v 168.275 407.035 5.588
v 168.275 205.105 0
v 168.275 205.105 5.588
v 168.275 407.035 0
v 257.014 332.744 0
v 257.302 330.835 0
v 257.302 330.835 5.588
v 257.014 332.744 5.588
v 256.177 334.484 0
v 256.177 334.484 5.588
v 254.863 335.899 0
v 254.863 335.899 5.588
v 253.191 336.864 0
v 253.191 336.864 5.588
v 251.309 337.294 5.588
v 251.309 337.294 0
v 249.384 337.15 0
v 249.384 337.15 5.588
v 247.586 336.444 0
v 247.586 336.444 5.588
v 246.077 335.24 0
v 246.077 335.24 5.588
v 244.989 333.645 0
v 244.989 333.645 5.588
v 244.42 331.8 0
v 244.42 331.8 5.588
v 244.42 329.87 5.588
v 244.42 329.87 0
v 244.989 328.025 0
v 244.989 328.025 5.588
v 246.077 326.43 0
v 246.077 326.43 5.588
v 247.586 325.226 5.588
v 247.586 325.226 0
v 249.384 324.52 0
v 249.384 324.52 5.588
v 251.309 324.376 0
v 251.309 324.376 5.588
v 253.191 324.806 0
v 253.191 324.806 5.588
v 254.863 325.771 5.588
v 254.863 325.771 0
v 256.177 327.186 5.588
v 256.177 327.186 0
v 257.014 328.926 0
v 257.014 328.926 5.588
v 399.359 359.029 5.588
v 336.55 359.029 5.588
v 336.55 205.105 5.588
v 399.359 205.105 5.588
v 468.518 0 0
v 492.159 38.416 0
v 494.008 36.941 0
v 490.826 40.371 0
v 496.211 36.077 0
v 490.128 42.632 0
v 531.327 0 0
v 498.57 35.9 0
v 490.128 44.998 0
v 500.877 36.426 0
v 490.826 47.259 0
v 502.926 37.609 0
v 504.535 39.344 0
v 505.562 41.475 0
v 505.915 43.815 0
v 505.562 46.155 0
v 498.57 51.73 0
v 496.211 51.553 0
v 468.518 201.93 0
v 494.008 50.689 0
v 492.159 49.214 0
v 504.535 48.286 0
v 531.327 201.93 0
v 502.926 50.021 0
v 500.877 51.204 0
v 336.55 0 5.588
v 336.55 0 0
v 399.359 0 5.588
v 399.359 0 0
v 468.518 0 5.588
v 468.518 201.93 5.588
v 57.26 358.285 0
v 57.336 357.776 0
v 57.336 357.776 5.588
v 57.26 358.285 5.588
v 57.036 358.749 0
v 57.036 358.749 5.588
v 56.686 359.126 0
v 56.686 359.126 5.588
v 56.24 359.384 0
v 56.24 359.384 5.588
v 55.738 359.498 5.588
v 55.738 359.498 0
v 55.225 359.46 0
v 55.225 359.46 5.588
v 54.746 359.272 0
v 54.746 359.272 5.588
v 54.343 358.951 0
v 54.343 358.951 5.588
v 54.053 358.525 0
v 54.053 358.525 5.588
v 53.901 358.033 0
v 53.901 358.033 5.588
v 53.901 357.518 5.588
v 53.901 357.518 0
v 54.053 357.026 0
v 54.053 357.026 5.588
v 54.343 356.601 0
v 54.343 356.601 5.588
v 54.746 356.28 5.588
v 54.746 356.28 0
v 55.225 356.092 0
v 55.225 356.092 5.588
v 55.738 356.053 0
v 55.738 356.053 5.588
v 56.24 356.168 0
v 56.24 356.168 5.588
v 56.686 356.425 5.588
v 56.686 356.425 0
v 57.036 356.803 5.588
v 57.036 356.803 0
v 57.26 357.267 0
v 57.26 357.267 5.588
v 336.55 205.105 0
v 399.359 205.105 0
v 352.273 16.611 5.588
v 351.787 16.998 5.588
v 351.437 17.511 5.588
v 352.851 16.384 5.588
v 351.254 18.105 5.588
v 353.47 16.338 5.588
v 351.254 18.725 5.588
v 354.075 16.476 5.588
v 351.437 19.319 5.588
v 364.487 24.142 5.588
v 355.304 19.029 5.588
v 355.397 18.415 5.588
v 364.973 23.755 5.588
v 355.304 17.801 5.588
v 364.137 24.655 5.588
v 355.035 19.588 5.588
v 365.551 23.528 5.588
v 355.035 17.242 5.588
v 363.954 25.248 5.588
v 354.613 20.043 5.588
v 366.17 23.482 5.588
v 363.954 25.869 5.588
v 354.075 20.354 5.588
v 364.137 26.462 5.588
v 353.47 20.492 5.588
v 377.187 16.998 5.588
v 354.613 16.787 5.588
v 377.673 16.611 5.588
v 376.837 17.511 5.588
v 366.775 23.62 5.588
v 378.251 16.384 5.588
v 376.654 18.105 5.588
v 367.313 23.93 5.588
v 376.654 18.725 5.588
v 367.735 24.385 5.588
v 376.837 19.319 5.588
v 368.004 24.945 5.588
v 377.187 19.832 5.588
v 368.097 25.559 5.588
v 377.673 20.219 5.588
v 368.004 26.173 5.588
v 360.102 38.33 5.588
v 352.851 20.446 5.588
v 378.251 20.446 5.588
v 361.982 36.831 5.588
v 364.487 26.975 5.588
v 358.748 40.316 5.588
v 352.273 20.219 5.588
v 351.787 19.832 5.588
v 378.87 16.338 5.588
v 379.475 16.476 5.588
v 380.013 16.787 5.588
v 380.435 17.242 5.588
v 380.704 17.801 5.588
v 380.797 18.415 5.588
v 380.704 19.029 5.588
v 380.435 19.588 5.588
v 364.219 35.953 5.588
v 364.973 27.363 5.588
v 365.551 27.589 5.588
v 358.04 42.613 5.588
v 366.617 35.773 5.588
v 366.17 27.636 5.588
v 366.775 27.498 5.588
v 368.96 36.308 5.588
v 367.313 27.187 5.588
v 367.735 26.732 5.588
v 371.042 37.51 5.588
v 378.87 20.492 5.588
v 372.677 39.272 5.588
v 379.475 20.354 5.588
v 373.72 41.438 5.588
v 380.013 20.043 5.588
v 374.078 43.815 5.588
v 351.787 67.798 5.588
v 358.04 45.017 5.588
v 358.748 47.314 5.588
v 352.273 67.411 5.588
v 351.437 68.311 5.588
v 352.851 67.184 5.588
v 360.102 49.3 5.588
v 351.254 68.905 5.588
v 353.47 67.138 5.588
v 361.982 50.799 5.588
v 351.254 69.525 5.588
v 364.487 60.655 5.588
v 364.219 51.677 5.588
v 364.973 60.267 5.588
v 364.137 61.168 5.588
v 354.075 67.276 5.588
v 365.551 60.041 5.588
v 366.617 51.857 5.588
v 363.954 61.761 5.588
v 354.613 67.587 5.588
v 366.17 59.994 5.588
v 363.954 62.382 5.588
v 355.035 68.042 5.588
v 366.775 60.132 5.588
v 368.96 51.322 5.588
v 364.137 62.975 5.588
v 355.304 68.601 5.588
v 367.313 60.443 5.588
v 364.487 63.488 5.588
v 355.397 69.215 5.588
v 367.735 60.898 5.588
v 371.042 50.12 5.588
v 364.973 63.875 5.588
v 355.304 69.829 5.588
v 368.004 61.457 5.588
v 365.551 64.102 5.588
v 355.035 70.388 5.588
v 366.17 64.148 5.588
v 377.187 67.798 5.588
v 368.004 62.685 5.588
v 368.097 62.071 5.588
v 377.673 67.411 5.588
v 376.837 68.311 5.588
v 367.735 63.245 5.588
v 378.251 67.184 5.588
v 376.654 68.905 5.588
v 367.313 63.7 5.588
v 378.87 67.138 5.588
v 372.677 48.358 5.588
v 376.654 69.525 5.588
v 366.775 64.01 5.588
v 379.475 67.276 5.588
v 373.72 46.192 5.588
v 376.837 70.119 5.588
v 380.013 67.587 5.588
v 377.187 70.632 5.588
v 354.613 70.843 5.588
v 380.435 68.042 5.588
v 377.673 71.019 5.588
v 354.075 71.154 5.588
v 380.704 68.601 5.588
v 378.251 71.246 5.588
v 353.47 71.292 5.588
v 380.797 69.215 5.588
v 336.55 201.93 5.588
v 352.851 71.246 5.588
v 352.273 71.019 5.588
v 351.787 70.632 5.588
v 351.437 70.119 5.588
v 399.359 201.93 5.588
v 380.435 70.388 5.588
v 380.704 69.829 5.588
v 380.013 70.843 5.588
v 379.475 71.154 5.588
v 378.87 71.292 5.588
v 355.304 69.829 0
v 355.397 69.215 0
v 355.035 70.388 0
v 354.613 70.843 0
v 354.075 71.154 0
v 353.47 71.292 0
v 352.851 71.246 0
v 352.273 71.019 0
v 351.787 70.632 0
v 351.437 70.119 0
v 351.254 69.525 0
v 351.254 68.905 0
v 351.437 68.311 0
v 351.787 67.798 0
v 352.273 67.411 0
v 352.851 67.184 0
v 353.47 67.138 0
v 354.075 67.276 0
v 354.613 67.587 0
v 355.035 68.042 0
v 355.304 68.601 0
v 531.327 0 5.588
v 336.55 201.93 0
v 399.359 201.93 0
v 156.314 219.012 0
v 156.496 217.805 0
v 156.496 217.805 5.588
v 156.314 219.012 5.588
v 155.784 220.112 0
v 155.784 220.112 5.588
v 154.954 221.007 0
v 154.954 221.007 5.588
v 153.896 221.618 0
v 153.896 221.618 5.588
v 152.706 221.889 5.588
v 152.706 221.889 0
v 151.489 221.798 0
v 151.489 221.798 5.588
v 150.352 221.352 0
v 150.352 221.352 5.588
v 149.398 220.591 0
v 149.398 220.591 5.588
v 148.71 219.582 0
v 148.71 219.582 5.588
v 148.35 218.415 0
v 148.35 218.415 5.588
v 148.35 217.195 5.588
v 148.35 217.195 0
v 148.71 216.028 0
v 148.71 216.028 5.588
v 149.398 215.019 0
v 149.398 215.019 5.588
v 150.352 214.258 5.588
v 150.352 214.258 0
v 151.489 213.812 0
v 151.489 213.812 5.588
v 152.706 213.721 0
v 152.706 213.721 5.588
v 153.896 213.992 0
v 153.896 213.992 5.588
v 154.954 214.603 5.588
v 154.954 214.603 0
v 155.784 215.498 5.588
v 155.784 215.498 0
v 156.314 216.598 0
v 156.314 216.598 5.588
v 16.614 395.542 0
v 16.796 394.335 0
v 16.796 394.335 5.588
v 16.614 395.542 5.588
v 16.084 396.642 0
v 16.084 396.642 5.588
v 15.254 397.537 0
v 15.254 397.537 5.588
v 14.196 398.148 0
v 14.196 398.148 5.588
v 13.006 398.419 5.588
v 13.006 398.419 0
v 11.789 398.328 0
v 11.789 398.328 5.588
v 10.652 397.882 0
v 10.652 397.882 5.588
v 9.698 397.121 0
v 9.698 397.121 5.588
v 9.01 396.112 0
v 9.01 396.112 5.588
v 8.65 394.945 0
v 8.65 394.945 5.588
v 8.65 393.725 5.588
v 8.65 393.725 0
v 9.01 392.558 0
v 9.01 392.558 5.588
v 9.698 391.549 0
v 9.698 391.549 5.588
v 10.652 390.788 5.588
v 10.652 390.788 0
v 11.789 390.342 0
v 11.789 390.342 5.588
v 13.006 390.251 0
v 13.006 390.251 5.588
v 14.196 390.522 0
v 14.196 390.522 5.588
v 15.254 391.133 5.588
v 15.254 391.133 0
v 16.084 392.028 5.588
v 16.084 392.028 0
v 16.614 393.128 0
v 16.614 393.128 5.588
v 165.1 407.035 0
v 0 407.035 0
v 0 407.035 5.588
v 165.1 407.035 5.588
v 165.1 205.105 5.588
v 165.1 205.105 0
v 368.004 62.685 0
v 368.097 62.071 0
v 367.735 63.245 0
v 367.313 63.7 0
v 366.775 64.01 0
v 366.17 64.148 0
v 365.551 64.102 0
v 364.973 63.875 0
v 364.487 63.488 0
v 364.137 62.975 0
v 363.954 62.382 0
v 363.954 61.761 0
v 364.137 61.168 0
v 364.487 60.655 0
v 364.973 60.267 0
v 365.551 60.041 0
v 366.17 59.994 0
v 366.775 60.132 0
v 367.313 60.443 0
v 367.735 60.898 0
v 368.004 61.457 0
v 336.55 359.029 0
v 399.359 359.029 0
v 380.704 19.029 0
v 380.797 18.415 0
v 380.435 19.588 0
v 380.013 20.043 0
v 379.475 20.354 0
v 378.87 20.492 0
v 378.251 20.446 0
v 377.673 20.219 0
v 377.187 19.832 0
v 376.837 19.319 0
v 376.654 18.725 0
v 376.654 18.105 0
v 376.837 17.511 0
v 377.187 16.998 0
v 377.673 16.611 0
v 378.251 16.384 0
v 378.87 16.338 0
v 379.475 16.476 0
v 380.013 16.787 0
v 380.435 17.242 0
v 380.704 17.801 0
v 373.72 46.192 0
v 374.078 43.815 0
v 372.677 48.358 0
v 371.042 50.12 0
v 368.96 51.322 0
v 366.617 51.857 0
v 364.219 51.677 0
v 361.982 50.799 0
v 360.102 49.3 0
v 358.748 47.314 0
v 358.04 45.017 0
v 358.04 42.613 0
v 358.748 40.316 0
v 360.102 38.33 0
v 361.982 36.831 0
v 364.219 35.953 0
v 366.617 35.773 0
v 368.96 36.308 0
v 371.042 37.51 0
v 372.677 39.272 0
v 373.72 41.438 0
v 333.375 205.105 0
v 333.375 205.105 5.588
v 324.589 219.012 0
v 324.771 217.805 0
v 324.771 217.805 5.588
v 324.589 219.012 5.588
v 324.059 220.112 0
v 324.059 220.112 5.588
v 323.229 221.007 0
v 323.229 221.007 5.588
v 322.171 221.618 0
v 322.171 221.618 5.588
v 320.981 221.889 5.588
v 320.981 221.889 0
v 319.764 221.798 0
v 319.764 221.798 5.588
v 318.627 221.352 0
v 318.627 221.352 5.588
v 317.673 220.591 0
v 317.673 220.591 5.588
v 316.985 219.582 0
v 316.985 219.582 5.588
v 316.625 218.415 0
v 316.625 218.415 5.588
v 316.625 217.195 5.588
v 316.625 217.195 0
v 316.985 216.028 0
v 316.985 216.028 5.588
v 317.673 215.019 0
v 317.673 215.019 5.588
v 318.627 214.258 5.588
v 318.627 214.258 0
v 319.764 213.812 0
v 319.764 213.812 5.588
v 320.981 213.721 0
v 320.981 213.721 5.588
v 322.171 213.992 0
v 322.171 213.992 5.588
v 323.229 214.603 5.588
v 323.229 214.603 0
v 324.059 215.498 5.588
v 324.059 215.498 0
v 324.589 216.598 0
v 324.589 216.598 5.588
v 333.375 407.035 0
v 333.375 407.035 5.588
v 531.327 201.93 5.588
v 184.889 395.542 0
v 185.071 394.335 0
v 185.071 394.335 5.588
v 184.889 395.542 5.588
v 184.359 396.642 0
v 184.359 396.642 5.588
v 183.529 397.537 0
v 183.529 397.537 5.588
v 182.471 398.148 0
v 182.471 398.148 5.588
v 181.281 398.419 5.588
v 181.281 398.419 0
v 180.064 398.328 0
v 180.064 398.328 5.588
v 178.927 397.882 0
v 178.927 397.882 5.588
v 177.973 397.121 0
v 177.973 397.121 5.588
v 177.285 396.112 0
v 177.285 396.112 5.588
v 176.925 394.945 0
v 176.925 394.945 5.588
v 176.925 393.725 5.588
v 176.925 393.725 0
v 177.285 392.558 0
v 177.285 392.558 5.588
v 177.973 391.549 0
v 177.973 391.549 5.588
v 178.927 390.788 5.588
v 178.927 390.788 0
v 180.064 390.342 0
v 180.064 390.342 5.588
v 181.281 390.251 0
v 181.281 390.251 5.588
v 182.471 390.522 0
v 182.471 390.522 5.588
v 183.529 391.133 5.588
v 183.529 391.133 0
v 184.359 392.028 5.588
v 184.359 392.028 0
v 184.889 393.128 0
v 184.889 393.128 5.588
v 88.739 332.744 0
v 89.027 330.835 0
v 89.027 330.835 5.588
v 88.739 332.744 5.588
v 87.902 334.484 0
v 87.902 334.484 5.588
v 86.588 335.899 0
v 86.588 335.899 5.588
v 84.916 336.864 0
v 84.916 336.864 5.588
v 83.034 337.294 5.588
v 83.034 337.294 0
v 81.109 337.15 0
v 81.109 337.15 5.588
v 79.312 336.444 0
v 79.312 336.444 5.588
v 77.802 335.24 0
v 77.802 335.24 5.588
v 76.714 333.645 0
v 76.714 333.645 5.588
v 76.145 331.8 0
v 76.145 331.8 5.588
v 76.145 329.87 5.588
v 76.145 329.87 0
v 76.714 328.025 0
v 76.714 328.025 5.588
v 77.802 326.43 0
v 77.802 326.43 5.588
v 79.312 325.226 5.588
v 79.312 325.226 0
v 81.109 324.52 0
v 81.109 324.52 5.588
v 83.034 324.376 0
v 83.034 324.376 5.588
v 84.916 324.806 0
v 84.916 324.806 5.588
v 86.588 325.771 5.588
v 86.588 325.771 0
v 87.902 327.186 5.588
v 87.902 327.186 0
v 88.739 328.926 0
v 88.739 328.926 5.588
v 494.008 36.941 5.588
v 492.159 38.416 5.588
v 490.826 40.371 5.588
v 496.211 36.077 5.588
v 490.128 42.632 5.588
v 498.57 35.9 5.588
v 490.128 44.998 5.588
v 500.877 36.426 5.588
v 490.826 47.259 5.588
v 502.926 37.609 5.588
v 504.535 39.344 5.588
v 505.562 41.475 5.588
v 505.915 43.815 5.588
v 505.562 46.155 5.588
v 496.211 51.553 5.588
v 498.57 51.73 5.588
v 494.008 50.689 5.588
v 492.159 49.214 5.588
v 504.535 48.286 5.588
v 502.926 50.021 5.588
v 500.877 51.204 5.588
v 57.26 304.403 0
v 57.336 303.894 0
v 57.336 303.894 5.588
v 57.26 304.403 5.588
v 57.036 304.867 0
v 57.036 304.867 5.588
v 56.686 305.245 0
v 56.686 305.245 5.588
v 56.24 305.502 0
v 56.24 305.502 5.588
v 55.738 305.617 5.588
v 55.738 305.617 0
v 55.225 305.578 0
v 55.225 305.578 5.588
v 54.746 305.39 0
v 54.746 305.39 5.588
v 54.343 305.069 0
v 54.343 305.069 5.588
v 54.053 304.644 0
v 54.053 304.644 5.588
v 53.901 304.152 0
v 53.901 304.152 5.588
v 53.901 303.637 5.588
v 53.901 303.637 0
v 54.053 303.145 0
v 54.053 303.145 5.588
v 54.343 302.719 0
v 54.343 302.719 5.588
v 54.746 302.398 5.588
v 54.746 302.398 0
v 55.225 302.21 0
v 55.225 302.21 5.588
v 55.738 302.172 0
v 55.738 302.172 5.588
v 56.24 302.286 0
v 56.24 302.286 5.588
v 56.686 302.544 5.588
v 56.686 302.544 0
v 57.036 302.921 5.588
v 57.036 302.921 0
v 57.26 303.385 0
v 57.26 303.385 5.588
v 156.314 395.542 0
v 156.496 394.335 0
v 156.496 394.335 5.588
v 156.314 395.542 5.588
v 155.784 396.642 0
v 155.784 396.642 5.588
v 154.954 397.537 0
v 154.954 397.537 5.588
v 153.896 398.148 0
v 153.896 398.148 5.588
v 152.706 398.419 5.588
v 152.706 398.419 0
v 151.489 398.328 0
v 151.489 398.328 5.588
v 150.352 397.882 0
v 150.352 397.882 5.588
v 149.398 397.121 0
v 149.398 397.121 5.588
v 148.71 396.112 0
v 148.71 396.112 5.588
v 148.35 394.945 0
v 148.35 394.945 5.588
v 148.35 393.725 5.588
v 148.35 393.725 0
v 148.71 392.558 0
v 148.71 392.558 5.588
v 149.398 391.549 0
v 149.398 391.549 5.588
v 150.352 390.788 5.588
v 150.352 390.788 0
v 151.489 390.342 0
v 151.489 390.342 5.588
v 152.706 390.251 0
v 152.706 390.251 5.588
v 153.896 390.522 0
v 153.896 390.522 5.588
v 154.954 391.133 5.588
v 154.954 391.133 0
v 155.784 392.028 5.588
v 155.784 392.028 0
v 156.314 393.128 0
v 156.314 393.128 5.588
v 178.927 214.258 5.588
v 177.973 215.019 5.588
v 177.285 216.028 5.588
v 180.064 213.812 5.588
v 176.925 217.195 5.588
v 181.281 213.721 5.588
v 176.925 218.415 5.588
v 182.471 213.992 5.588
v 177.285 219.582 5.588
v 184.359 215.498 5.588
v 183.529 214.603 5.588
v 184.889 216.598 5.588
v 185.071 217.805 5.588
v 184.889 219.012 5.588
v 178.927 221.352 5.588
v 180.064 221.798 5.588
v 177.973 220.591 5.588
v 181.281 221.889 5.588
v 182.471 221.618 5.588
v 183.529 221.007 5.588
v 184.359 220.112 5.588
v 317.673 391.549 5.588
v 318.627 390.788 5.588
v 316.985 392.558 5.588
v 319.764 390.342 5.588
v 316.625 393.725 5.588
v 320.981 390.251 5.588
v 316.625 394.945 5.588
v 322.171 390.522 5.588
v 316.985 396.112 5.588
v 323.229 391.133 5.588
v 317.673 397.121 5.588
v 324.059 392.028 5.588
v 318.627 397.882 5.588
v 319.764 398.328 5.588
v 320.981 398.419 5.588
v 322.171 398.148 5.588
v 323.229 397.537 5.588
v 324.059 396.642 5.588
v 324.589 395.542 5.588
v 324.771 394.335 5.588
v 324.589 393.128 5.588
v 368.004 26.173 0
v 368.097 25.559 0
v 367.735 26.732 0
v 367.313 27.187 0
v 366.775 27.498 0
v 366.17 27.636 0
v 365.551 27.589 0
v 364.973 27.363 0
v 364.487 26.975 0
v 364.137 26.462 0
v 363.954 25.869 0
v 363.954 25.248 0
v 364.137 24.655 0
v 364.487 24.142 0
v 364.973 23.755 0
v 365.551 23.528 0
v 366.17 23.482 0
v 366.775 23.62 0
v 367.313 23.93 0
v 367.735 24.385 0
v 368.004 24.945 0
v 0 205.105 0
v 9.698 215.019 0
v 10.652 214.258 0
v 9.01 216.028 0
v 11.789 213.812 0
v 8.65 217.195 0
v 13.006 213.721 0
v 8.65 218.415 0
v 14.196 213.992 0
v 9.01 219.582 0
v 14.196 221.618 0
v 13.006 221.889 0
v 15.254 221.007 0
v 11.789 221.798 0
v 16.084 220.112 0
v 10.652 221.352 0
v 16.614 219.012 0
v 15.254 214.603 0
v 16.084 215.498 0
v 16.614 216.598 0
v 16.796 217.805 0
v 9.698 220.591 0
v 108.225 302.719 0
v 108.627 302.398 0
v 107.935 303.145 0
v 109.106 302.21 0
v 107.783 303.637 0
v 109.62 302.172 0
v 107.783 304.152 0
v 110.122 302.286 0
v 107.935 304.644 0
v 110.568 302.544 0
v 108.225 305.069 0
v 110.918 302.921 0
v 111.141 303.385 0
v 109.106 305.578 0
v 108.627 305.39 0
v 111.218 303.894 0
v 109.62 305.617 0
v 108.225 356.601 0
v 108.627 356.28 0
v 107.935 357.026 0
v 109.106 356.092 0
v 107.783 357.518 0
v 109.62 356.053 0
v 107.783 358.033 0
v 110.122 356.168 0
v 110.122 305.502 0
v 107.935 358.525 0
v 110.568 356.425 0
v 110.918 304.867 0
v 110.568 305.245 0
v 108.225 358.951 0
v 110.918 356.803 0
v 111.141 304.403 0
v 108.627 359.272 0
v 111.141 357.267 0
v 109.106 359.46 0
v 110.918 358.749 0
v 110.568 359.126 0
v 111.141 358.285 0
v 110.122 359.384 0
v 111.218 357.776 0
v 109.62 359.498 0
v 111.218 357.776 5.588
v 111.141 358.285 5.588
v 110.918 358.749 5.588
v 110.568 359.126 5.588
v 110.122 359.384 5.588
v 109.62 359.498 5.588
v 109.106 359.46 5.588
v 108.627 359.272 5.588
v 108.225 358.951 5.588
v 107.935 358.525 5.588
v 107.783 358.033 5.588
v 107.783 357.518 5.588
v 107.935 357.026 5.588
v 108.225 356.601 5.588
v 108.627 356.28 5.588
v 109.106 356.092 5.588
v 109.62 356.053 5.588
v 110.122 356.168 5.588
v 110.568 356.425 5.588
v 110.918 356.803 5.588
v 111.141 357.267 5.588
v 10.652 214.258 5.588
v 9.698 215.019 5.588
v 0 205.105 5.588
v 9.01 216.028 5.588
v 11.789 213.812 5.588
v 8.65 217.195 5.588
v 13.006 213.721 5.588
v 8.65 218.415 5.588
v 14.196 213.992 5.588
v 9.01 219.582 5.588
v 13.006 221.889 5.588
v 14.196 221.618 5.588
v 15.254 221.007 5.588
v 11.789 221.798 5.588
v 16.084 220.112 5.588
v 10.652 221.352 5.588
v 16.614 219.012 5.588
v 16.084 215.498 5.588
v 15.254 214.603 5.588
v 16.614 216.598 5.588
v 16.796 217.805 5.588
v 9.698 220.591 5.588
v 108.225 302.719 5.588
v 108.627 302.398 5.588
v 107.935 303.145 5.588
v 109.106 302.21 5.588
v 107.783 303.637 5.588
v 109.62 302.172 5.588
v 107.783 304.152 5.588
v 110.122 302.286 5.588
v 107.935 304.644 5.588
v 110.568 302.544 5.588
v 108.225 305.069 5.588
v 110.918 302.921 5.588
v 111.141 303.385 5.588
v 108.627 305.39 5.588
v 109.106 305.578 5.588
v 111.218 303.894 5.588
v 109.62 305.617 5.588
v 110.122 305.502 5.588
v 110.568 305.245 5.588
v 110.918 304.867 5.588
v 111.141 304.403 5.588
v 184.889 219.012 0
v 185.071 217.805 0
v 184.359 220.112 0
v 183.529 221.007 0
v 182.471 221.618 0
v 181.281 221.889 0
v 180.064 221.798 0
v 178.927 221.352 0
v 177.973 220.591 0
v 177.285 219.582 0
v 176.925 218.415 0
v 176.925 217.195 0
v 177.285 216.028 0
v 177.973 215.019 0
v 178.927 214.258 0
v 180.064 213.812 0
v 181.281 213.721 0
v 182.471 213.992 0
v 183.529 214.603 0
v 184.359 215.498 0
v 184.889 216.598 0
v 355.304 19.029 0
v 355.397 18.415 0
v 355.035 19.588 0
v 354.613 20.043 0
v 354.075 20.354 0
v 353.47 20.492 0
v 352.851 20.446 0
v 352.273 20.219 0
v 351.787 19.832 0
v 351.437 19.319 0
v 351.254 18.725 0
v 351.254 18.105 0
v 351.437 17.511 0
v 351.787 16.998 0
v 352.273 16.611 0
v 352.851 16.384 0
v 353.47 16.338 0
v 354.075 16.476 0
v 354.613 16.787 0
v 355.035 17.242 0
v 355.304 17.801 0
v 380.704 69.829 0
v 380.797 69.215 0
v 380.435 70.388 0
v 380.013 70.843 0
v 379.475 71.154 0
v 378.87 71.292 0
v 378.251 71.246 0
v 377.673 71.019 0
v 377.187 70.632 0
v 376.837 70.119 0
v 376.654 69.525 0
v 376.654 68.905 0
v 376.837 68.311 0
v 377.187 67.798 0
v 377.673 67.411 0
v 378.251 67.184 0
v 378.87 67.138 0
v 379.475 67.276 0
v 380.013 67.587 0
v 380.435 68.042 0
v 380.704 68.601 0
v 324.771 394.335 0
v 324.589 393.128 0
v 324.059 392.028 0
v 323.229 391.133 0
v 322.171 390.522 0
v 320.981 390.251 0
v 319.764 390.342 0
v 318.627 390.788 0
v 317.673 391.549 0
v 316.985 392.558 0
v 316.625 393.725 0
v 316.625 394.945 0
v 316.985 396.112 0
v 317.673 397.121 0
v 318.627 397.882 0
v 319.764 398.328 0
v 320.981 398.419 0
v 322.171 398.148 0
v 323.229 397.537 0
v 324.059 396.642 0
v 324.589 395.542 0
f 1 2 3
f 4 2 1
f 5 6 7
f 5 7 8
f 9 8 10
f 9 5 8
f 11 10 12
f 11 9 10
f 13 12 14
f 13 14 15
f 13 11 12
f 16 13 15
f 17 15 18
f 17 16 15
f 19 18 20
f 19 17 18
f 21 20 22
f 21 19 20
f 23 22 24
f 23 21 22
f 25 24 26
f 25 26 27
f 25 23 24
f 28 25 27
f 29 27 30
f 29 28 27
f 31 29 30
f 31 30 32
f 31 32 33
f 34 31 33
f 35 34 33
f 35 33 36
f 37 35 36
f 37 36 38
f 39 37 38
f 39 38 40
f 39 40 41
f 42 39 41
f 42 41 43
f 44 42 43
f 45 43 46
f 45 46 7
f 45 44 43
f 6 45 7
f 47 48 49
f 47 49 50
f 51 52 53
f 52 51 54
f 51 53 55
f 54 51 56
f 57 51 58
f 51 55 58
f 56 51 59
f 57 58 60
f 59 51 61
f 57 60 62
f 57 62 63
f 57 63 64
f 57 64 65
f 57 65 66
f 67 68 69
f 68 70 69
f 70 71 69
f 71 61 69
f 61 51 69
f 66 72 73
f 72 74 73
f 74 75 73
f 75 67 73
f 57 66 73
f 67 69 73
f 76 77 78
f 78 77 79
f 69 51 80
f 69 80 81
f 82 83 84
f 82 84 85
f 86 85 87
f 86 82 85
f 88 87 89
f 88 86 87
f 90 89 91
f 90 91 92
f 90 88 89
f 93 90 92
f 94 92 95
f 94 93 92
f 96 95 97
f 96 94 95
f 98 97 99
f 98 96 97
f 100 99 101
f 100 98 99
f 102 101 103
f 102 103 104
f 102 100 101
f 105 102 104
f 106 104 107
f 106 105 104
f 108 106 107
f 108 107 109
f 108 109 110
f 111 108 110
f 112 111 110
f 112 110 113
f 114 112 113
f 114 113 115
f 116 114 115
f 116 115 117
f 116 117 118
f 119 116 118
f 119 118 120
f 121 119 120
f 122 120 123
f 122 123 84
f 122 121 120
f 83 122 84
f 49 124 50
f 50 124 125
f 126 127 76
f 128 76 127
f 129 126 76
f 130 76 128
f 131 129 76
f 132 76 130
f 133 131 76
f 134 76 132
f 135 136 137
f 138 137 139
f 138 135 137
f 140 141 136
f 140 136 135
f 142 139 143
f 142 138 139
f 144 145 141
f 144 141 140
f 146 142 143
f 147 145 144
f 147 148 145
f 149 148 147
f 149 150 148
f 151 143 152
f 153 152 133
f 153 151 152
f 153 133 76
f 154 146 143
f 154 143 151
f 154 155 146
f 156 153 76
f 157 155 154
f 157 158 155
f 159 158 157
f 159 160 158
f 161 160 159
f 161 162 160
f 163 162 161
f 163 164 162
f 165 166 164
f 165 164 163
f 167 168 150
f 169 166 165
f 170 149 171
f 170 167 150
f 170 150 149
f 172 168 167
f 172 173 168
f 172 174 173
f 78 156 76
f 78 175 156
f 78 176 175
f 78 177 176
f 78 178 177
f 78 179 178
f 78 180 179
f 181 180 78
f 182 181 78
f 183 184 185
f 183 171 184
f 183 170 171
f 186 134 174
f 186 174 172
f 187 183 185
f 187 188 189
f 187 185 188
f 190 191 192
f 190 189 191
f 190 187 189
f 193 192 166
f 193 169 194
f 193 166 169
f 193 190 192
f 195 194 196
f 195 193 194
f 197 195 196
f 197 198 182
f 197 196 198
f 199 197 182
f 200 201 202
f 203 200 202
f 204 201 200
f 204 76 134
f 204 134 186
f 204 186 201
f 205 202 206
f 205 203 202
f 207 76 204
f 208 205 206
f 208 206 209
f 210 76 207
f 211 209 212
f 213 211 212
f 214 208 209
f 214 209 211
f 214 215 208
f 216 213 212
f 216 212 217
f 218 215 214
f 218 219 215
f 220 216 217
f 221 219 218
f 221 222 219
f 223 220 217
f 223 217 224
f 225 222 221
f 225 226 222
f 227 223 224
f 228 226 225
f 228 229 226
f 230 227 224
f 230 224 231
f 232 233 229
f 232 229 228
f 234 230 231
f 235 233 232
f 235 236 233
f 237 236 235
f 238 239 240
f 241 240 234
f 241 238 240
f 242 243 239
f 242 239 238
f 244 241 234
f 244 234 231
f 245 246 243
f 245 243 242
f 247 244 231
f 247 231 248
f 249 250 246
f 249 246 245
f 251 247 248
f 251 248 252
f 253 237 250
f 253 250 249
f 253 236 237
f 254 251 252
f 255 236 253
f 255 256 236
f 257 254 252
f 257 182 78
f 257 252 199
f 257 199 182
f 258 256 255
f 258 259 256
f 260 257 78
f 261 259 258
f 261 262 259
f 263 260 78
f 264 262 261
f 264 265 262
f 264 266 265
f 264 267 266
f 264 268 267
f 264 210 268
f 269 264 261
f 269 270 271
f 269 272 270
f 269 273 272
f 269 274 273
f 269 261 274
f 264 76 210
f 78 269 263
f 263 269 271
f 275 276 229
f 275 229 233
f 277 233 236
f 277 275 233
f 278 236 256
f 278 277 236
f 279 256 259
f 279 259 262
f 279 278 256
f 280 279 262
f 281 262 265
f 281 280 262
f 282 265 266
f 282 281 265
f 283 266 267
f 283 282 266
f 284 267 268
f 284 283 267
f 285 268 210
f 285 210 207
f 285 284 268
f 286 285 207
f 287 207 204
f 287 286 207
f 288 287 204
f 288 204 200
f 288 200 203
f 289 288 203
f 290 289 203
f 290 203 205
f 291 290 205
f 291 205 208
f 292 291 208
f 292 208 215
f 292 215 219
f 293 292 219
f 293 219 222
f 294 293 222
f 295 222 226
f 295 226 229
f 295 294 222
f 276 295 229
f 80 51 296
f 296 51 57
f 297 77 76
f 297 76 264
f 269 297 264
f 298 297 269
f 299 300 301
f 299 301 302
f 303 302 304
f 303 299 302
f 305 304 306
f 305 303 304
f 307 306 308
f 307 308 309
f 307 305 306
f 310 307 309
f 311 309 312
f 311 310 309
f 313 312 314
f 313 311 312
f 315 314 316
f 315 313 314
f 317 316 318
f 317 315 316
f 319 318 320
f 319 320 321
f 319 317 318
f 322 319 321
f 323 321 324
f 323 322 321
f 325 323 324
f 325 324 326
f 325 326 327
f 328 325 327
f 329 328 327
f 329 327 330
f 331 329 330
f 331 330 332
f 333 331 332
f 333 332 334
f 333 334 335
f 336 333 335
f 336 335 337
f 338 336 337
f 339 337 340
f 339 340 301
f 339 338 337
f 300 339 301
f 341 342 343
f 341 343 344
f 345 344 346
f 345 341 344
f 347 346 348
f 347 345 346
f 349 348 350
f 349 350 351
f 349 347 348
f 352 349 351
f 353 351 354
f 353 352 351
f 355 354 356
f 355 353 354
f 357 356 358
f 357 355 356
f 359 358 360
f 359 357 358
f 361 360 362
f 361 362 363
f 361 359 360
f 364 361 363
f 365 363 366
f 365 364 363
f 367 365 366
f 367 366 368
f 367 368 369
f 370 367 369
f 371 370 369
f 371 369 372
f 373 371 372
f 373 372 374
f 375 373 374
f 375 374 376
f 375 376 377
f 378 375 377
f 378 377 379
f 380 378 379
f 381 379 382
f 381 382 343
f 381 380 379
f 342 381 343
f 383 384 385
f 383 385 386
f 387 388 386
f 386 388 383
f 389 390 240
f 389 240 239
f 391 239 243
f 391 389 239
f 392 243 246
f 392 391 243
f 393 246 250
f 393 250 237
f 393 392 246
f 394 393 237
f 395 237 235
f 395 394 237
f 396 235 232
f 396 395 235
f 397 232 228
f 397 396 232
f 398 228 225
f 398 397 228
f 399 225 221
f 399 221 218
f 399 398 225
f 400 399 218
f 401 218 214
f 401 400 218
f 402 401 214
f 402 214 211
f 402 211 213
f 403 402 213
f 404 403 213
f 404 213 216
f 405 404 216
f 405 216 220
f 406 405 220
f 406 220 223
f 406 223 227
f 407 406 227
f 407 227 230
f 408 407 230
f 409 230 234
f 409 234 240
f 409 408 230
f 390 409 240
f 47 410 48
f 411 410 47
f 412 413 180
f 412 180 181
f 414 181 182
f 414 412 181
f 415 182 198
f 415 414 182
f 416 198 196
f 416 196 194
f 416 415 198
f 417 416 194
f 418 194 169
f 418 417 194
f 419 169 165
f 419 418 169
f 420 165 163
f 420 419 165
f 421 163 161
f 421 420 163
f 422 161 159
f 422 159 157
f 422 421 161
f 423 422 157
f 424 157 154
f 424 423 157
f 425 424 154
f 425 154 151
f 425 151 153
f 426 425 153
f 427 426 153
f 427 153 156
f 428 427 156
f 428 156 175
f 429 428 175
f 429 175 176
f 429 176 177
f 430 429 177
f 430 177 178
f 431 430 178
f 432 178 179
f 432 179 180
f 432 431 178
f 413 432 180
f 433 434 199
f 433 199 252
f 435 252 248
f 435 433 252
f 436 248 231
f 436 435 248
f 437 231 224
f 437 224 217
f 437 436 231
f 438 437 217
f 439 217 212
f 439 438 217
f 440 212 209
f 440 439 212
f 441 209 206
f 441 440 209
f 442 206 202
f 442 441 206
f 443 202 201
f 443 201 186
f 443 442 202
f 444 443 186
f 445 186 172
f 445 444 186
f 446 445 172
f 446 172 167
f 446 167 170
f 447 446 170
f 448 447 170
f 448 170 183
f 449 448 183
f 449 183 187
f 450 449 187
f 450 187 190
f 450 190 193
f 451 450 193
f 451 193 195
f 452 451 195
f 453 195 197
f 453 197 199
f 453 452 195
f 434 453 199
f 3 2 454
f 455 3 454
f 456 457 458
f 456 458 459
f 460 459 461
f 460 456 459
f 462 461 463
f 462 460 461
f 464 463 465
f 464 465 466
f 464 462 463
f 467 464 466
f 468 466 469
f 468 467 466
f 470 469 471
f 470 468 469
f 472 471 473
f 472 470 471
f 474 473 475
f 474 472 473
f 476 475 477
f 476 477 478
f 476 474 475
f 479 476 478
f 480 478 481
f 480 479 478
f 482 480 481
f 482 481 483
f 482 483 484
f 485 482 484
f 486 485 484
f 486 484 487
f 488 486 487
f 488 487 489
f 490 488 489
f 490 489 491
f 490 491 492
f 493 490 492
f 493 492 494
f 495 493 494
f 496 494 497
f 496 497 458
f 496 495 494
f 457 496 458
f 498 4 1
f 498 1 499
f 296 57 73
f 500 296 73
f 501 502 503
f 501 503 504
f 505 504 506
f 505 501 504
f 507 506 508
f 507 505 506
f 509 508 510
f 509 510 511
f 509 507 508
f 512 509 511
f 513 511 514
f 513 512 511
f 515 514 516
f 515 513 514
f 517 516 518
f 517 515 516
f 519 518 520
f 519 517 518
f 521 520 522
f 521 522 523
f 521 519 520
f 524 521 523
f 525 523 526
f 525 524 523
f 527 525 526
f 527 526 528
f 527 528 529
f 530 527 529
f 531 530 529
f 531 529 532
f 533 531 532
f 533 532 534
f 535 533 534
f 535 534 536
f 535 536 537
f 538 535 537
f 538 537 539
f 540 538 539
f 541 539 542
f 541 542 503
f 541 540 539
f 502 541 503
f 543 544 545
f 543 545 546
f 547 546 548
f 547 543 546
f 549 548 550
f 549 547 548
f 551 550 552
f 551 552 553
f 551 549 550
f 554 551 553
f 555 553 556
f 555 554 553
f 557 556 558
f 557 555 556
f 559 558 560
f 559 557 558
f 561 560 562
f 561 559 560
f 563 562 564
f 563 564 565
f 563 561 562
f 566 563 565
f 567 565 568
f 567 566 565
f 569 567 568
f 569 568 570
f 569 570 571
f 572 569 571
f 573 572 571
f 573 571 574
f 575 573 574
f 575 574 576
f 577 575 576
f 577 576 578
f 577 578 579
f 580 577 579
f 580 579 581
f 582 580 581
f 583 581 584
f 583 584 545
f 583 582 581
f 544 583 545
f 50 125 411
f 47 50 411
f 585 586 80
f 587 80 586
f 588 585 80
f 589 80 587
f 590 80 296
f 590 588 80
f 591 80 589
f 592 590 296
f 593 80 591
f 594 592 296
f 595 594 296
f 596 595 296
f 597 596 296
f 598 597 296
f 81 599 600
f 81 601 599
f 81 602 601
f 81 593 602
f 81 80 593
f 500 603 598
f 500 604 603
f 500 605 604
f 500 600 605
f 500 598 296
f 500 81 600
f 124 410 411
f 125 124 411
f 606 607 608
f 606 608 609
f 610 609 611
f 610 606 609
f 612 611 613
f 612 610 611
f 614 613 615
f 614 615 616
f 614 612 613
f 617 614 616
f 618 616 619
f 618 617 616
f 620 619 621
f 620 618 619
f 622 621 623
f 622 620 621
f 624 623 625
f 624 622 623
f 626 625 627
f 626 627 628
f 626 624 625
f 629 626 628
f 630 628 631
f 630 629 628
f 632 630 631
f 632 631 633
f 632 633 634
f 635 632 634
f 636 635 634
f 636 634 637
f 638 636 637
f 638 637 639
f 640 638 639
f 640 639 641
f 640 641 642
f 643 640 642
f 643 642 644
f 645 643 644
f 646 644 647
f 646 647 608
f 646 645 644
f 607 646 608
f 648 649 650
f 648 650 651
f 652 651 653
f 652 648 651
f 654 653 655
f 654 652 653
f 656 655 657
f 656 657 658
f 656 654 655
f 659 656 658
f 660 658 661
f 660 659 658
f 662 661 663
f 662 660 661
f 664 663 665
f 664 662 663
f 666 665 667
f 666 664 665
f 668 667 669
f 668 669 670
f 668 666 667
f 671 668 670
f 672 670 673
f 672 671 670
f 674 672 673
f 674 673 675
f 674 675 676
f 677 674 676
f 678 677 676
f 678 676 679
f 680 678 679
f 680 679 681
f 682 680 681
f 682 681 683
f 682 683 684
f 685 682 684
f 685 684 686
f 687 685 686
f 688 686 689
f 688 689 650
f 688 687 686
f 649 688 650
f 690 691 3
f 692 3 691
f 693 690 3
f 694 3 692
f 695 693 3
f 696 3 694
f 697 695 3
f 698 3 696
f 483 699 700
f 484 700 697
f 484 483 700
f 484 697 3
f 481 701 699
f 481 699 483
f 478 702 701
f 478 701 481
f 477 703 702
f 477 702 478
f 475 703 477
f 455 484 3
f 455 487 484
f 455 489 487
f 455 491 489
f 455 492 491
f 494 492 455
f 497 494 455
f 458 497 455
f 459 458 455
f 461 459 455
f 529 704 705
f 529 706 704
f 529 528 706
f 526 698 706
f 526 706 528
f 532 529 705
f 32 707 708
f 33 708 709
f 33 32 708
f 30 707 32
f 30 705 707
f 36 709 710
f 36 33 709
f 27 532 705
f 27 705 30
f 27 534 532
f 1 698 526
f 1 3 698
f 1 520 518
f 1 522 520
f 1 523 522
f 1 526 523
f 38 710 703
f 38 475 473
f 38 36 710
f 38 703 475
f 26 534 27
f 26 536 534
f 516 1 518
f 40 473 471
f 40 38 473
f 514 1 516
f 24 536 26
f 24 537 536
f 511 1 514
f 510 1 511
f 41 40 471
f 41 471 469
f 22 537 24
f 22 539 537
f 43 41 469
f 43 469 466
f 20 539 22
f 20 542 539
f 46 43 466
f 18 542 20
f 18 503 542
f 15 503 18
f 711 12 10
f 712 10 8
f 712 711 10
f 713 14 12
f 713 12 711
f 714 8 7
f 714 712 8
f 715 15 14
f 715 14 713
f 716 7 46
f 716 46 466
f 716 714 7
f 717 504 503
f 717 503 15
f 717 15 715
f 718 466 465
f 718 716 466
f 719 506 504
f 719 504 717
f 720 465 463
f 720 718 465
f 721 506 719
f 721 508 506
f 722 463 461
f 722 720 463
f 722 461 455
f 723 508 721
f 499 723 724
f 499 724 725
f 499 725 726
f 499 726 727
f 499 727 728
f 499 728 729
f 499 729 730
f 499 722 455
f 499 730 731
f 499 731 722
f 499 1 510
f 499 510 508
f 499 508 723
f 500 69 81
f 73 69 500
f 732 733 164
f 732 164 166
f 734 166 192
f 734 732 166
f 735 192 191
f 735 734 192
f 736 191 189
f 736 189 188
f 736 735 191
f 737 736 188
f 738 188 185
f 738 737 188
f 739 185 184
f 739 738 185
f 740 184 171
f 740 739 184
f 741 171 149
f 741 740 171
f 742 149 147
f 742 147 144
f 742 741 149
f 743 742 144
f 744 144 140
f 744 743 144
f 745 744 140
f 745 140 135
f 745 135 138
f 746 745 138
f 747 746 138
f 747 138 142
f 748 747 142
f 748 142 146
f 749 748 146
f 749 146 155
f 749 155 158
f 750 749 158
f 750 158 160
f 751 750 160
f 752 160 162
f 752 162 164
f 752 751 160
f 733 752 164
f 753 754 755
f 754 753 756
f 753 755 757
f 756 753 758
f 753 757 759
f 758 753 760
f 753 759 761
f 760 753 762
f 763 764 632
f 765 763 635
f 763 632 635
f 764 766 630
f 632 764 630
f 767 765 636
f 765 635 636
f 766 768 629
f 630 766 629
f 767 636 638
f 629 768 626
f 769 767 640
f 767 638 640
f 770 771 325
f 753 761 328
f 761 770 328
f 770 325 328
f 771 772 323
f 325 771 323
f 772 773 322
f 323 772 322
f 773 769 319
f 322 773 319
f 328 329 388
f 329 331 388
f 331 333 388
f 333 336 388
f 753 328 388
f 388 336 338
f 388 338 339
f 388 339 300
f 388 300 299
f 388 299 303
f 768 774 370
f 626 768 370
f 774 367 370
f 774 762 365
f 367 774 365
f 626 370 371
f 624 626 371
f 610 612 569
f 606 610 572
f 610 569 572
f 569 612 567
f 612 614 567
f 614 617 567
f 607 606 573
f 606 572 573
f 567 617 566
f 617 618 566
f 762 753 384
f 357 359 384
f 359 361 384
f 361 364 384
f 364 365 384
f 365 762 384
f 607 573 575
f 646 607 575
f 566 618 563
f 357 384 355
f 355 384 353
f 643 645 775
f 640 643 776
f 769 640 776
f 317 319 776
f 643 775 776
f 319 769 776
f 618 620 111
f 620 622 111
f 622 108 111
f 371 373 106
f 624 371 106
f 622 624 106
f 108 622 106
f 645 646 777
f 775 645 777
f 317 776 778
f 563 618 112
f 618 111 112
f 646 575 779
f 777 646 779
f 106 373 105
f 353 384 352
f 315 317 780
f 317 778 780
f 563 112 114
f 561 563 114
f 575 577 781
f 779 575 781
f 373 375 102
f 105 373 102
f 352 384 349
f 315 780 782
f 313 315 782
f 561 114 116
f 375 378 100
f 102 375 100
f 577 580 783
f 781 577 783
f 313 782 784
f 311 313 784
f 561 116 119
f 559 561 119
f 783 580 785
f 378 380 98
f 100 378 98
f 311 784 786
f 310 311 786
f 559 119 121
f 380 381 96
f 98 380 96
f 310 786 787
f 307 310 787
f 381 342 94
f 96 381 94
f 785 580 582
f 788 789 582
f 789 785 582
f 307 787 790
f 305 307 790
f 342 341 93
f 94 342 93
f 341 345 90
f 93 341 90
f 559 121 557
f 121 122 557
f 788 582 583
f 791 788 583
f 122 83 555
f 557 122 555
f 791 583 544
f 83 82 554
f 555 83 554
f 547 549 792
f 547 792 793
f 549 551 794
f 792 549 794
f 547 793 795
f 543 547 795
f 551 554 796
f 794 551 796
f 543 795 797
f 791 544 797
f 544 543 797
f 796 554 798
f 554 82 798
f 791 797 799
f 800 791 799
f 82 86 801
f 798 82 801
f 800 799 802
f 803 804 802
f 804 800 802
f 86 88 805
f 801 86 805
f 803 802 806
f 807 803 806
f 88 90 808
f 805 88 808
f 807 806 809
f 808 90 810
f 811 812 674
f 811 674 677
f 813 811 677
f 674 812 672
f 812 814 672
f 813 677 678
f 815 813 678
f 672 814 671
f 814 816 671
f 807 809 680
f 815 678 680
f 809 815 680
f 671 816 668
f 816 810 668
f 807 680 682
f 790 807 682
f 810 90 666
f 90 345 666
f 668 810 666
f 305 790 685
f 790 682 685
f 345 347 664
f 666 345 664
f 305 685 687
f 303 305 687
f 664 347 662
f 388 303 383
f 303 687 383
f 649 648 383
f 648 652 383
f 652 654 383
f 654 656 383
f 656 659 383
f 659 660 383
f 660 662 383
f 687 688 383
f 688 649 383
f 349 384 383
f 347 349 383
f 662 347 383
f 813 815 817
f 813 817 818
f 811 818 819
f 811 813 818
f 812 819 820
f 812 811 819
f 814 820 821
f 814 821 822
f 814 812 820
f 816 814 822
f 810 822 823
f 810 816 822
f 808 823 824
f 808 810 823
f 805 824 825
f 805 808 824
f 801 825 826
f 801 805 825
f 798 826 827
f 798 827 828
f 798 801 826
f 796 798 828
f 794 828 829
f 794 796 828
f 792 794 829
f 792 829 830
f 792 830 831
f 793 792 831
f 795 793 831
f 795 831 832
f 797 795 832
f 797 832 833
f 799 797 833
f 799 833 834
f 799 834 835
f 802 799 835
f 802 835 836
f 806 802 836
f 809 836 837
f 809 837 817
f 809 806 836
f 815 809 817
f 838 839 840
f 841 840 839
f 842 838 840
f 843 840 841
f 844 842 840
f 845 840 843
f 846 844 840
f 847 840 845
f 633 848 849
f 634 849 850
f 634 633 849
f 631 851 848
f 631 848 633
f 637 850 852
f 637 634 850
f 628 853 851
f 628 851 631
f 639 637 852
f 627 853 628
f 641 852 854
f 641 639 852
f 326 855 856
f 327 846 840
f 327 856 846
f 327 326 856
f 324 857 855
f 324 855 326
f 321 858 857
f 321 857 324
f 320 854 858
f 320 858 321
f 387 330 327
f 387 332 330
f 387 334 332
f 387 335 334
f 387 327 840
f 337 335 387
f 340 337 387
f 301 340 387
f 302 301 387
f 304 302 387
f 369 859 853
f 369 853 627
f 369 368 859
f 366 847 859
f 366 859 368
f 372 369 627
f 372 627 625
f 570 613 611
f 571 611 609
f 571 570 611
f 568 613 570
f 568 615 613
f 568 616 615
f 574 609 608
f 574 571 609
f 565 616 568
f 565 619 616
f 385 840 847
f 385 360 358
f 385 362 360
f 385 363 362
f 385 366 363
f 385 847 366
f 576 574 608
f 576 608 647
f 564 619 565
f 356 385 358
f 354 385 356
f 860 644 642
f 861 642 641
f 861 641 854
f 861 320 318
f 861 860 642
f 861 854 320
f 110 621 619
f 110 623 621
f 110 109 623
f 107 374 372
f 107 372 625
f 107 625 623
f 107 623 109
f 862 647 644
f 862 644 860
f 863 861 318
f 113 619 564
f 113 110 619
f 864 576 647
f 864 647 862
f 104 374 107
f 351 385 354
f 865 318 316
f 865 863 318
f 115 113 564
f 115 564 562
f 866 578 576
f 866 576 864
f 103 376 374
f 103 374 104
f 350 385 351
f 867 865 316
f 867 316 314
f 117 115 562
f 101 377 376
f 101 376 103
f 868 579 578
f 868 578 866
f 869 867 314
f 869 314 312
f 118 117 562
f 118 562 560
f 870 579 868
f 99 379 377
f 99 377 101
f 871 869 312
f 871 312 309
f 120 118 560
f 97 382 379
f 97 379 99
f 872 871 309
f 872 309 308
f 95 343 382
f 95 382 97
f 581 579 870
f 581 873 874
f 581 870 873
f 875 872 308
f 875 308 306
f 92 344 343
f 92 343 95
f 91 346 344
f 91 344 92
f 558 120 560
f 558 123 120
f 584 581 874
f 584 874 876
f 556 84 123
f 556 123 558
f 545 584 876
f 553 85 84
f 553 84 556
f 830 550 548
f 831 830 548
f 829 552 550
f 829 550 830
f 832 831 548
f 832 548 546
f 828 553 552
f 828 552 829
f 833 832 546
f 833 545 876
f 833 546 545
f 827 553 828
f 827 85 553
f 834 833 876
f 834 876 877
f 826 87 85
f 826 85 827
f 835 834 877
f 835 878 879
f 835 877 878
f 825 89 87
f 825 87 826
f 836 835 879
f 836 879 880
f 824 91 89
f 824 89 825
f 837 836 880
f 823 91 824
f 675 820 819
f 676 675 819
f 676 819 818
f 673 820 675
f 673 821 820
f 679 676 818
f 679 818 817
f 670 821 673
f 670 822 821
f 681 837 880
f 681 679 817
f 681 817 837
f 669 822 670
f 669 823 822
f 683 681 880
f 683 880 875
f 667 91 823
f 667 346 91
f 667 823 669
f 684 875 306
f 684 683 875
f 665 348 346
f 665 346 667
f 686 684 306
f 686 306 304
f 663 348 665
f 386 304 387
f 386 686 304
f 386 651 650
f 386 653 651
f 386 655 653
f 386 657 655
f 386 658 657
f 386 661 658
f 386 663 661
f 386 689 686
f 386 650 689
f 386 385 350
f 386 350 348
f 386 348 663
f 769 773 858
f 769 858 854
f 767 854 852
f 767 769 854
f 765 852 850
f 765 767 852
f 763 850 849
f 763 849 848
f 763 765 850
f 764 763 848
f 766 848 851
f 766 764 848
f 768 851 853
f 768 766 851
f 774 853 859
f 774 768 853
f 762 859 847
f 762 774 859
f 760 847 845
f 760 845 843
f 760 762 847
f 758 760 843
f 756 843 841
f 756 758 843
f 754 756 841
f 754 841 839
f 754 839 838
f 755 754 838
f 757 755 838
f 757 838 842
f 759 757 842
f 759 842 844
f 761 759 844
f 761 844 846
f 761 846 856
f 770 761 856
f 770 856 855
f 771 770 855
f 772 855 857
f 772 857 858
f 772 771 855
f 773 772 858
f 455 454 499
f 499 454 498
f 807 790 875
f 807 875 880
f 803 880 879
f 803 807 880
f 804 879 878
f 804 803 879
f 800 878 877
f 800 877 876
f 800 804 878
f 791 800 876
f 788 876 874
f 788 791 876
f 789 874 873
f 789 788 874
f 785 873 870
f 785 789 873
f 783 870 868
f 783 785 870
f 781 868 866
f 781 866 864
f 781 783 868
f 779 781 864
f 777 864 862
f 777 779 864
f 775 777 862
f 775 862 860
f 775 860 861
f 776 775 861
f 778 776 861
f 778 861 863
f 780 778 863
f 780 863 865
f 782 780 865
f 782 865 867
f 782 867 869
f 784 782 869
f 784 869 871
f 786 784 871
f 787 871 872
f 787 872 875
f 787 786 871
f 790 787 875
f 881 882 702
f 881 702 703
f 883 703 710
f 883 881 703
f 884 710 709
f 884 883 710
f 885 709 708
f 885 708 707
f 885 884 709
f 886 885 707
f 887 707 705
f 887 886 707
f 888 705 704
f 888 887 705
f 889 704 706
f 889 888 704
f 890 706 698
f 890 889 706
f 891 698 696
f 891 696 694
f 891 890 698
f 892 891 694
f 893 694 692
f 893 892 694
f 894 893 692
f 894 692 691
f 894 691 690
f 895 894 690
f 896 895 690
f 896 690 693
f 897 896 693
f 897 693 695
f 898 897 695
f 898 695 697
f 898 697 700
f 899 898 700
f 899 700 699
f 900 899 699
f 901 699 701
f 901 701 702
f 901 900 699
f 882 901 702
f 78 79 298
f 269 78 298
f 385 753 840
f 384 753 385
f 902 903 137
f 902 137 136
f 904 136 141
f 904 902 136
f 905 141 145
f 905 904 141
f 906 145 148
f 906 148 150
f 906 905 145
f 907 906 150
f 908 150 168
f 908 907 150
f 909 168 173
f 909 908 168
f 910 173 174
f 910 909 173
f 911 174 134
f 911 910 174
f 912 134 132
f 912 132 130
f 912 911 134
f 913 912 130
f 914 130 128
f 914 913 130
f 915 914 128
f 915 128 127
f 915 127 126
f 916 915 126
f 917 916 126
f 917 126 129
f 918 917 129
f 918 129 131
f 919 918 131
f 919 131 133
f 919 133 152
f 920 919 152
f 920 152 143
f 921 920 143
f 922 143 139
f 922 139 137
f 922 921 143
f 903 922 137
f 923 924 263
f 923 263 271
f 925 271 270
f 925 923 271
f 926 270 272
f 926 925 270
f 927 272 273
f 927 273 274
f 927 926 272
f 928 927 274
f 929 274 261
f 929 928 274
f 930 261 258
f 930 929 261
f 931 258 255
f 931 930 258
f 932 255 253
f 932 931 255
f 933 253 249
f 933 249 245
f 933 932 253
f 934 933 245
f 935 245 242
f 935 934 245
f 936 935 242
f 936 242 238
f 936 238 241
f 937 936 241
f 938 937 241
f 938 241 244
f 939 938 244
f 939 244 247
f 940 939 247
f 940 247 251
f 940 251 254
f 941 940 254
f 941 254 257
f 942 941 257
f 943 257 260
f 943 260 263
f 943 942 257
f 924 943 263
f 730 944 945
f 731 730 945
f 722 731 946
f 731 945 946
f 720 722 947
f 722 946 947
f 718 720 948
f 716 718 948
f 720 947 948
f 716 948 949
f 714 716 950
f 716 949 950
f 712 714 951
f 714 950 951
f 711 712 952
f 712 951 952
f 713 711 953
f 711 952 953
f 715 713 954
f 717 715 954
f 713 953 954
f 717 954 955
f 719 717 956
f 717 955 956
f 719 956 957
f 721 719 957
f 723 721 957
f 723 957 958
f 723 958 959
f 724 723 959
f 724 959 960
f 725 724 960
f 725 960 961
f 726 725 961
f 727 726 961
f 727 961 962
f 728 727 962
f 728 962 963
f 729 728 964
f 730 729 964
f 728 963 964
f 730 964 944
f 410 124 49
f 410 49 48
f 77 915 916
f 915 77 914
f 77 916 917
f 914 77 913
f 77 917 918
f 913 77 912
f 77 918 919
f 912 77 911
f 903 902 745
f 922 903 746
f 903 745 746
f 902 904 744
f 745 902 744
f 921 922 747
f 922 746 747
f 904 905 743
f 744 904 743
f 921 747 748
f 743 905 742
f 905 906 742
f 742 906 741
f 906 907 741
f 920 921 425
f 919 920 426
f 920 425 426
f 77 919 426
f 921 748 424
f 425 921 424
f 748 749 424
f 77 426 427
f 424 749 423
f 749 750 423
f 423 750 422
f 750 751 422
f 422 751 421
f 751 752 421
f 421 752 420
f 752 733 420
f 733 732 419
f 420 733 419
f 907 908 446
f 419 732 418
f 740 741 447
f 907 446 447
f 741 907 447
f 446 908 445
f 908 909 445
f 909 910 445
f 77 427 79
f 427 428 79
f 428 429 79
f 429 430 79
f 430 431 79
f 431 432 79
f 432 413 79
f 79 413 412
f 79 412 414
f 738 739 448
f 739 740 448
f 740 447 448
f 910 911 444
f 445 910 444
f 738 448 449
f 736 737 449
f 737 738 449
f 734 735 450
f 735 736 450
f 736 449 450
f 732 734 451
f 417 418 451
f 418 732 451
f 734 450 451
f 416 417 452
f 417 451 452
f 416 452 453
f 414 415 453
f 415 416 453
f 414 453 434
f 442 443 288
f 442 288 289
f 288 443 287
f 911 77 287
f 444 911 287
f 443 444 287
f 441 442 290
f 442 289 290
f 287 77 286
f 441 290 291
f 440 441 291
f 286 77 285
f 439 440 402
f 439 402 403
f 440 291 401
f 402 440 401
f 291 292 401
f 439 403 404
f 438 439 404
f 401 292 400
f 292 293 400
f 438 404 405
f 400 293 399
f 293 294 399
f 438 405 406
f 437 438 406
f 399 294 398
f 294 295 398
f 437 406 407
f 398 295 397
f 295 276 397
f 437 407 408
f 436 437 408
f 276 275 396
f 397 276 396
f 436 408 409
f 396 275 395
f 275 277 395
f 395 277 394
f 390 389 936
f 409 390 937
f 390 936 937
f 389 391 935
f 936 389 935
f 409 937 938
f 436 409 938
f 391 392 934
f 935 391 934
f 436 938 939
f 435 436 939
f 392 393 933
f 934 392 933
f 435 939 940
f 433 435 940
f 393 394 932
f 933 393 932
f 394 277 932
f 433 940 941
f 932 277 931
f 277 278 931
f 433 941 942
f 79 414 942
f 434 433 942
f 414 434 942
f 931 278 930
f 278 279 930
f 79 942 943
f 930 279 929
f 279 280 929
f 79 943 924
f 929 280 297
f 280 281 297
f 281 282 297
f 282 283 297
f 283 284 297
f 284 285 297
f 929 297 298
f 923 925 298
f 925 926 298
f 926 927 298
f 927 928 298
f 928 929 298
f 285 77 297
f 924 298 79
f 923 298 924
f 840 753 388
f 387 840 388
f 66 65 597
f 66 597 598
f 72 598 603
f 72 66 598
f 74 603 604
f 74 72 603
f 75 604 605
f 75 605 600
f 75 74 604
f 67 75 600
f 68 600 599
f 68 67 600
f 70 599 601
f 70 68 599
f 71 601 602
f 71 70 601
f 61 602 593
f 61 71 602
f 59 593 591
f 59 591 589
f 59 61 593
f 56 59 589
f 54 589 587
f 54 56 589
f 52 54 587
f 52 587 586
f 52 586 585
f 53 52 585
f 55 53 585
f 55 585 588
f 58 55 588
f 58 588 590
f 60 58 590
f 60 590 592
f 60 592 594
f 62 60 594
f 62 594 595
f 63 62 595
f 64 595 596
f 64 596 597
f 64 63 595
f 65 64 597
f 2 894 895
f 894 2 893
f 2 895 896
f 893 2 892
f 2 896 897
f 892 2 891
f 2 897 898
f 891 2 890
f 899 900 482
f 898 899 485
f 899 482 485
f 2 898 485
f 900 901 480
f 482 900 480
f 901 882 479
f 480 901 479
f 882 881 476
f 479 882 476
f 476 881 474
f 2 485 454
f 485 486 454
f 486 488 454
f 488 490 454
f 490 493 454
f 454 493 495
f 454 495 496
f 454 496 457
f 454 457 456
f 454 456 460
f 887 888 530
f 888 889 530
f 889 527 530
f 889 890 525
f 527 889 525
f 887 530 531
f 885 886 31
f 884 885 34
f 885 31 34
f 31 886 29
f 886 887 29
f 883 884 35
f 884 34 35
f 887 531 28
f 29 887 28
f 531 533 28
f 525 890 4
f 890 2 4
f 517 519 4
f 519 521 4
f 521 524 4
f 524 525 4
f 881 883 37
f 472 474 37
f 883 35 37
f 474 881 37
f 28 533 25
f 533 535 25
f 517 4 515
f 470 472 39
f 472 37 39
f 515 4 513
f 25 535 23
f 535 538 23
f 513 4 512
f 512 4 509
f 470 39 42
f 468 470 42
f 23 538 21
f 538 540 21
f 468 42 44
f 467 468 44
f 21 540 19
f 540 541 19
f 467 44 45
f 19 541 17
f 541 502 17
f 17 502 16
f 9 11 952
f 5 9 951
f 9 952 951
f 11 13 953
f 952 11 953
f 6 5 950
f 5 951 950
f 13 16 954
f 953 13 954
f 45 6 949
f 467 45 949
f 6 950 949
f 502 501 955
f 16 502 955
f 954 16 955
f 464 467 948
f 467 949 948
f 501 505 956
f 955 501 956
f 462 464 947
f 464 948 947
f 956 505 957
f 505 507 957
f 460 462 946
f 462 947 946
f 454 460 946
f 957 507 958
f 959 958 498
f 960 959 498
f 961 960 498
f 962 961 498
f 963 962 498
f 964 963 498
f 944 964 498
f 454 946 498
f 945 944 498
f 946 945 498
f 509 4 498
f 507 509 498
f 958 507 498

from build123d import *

# Parameters (mm, degrees)
F0_W     = 165.1
F0_H     = 201.93
F0_R     = 4.09575
F0_R_2   = 1.7272
F0_R_3   = 6.477
F1_DEPTH = 5.588
F0_W_2   = 62.80912
F0_R_4   = 2.0828
F0_R_5   = 8.0645
F2_DEPTH = 5.588
F0_H_2   = 153.924
F3_DEPTH = 5.588
F0_R_6   = 7.9375
F4_DEPTH = 5.588
F5_DEPTH = 5.588


with BuildPart() as f1:
    # F0 (on Top) → F1 (new body)
    with BuildSketch(Plane.XY):
        with Locations((82.55, 306.07)):
            Rectangle(F0_W, F0_H)
        with Locations((12.7, 217.805)):
            Circle(F0_R, mode=Mode.SUBTRACT)
        with Locations((55.609232, 303.894232)):
            Circle(F0_R_2, mode=Mode.SUBTRACT)
        with Locations((109.490768, 303.894232)):
            Circle(F0_R_2, mode=Mode.SUBTRACT)
        with Locations((152.4, 217.805)):
            Circle(F0_R, mode=Mode.SUBTRACT)
        with Locations((82.55, 330.835)):
            Circle(F0_R_3, mode=Mode.SUBTRACT)
        with Locations((55.609232, 357.775768)):
            Circle(F0_R_2, mode=Mode.SUBTRACT)
        with Locations((12.7, 394.335)):
            Circle(F0_R, mode=Mode.SUBTRACT)
        with Locations((109.490768, 357.775768)):
            Circle(F0_R_2, mode=Mode.SUBTRACT)
        with Locations((152.4, 394.335)):
            Circle(F0_R, mode=Mode.SUBTRACT)
    extrude(amount=F1_DEPTH)


with BuildPart() as f2:
    # F0 (on Top) → F2 (new body)
    with BuildSketch(Plane.XY):
        with Locations((367.95456, 100.965)):
            Rectangle(F0_W_2, F0_H)
        with Locations((353.314, 18.415)):
            Circle(F0_R_4, mode=Mode.SUBTRACT)
        with Locations((366.014, 25.55875)):
            Circle(F0_R_4, mode=Mode.SUBTRACT)
        with Locations((366.014, 43.815)):
            Circle(F0_R_5, mode=Mode.SUBTRACT)
        with Locations((378.714, 18.415)):
            Circle(F0_R_4, mode=Mode.SUBTRACT)
        with Locations((366.014, 62.07125)):
            Circle(F0_R_4, mode=Mode.SUBTRACT)
        with Locations((353.314, 69.215)):
            Circle(F0_R_4, mode=Mode.SUBTRACT)
        with Locations((378.714, 69.215)):
            Circle(F0_R_4, mode=Mode.SUBTRACT)
    extrude(amount=F2_DEPTH)


with BuildPart() as f3:
    # F0 (on Top) → F3 (new body)
    with BuildSketch(Plane.XY):
        with Locations((367.95456, 282.067)):
            Rectangle(F0_W_2, F0_H_2)
    extrude(amount=F3_DEPTH)


with BuildPart() as f4:
    # F0 (on Top) → F4 (new body)
    with BuildSketch(Plane.XY):
        with Locations((499.9228, 100.965)):
            Rectangle(F0_W_2, F0_H)
        with Locations((497.97716, 43.815)):
            Circle(F0_R_6, mode=Mode.SUBTRACT)
    extrude(amount=F4_DEPTH)


with BuildPart() as f5:
    # F0 (on Top) → F5 (new body)
    with BuildSketch(Plane.XY):
        with Locations((250.825, 306.07)):
            Rectangle(F0_W, F0_H)
        with Locations((180.975, 217.805)):
            Circle(F0_R, mode=Mode.SUBTRACT)
        with Locations((250.825, 330.835)):
            Circle(F0_R_3, mode=Mode.SUBTRACT)
        with Locations((180.975, 394.335)):
            Circle(F0_R, mode=Mode.SUBTRACT)
        with Locations((320.675, 217.805)):
            Circle(F0_R, mode=Mode.SUBTRACT)
        with BuildLine():
            ThreePointArc((316.57925, 394.335), (320.675, 398.43075), (324.77075, 394.335))
            ThreePointArc((324.77075, 394.335), (320.675, 390.23925), (316.57925, 394.335))
        make_face(mode=Mode.SUBTRACT)
    extrude(amount=F5_DEPTH)


solid = Compound([f1.part, f2.part, f3.part, f4.part, f5.part])
